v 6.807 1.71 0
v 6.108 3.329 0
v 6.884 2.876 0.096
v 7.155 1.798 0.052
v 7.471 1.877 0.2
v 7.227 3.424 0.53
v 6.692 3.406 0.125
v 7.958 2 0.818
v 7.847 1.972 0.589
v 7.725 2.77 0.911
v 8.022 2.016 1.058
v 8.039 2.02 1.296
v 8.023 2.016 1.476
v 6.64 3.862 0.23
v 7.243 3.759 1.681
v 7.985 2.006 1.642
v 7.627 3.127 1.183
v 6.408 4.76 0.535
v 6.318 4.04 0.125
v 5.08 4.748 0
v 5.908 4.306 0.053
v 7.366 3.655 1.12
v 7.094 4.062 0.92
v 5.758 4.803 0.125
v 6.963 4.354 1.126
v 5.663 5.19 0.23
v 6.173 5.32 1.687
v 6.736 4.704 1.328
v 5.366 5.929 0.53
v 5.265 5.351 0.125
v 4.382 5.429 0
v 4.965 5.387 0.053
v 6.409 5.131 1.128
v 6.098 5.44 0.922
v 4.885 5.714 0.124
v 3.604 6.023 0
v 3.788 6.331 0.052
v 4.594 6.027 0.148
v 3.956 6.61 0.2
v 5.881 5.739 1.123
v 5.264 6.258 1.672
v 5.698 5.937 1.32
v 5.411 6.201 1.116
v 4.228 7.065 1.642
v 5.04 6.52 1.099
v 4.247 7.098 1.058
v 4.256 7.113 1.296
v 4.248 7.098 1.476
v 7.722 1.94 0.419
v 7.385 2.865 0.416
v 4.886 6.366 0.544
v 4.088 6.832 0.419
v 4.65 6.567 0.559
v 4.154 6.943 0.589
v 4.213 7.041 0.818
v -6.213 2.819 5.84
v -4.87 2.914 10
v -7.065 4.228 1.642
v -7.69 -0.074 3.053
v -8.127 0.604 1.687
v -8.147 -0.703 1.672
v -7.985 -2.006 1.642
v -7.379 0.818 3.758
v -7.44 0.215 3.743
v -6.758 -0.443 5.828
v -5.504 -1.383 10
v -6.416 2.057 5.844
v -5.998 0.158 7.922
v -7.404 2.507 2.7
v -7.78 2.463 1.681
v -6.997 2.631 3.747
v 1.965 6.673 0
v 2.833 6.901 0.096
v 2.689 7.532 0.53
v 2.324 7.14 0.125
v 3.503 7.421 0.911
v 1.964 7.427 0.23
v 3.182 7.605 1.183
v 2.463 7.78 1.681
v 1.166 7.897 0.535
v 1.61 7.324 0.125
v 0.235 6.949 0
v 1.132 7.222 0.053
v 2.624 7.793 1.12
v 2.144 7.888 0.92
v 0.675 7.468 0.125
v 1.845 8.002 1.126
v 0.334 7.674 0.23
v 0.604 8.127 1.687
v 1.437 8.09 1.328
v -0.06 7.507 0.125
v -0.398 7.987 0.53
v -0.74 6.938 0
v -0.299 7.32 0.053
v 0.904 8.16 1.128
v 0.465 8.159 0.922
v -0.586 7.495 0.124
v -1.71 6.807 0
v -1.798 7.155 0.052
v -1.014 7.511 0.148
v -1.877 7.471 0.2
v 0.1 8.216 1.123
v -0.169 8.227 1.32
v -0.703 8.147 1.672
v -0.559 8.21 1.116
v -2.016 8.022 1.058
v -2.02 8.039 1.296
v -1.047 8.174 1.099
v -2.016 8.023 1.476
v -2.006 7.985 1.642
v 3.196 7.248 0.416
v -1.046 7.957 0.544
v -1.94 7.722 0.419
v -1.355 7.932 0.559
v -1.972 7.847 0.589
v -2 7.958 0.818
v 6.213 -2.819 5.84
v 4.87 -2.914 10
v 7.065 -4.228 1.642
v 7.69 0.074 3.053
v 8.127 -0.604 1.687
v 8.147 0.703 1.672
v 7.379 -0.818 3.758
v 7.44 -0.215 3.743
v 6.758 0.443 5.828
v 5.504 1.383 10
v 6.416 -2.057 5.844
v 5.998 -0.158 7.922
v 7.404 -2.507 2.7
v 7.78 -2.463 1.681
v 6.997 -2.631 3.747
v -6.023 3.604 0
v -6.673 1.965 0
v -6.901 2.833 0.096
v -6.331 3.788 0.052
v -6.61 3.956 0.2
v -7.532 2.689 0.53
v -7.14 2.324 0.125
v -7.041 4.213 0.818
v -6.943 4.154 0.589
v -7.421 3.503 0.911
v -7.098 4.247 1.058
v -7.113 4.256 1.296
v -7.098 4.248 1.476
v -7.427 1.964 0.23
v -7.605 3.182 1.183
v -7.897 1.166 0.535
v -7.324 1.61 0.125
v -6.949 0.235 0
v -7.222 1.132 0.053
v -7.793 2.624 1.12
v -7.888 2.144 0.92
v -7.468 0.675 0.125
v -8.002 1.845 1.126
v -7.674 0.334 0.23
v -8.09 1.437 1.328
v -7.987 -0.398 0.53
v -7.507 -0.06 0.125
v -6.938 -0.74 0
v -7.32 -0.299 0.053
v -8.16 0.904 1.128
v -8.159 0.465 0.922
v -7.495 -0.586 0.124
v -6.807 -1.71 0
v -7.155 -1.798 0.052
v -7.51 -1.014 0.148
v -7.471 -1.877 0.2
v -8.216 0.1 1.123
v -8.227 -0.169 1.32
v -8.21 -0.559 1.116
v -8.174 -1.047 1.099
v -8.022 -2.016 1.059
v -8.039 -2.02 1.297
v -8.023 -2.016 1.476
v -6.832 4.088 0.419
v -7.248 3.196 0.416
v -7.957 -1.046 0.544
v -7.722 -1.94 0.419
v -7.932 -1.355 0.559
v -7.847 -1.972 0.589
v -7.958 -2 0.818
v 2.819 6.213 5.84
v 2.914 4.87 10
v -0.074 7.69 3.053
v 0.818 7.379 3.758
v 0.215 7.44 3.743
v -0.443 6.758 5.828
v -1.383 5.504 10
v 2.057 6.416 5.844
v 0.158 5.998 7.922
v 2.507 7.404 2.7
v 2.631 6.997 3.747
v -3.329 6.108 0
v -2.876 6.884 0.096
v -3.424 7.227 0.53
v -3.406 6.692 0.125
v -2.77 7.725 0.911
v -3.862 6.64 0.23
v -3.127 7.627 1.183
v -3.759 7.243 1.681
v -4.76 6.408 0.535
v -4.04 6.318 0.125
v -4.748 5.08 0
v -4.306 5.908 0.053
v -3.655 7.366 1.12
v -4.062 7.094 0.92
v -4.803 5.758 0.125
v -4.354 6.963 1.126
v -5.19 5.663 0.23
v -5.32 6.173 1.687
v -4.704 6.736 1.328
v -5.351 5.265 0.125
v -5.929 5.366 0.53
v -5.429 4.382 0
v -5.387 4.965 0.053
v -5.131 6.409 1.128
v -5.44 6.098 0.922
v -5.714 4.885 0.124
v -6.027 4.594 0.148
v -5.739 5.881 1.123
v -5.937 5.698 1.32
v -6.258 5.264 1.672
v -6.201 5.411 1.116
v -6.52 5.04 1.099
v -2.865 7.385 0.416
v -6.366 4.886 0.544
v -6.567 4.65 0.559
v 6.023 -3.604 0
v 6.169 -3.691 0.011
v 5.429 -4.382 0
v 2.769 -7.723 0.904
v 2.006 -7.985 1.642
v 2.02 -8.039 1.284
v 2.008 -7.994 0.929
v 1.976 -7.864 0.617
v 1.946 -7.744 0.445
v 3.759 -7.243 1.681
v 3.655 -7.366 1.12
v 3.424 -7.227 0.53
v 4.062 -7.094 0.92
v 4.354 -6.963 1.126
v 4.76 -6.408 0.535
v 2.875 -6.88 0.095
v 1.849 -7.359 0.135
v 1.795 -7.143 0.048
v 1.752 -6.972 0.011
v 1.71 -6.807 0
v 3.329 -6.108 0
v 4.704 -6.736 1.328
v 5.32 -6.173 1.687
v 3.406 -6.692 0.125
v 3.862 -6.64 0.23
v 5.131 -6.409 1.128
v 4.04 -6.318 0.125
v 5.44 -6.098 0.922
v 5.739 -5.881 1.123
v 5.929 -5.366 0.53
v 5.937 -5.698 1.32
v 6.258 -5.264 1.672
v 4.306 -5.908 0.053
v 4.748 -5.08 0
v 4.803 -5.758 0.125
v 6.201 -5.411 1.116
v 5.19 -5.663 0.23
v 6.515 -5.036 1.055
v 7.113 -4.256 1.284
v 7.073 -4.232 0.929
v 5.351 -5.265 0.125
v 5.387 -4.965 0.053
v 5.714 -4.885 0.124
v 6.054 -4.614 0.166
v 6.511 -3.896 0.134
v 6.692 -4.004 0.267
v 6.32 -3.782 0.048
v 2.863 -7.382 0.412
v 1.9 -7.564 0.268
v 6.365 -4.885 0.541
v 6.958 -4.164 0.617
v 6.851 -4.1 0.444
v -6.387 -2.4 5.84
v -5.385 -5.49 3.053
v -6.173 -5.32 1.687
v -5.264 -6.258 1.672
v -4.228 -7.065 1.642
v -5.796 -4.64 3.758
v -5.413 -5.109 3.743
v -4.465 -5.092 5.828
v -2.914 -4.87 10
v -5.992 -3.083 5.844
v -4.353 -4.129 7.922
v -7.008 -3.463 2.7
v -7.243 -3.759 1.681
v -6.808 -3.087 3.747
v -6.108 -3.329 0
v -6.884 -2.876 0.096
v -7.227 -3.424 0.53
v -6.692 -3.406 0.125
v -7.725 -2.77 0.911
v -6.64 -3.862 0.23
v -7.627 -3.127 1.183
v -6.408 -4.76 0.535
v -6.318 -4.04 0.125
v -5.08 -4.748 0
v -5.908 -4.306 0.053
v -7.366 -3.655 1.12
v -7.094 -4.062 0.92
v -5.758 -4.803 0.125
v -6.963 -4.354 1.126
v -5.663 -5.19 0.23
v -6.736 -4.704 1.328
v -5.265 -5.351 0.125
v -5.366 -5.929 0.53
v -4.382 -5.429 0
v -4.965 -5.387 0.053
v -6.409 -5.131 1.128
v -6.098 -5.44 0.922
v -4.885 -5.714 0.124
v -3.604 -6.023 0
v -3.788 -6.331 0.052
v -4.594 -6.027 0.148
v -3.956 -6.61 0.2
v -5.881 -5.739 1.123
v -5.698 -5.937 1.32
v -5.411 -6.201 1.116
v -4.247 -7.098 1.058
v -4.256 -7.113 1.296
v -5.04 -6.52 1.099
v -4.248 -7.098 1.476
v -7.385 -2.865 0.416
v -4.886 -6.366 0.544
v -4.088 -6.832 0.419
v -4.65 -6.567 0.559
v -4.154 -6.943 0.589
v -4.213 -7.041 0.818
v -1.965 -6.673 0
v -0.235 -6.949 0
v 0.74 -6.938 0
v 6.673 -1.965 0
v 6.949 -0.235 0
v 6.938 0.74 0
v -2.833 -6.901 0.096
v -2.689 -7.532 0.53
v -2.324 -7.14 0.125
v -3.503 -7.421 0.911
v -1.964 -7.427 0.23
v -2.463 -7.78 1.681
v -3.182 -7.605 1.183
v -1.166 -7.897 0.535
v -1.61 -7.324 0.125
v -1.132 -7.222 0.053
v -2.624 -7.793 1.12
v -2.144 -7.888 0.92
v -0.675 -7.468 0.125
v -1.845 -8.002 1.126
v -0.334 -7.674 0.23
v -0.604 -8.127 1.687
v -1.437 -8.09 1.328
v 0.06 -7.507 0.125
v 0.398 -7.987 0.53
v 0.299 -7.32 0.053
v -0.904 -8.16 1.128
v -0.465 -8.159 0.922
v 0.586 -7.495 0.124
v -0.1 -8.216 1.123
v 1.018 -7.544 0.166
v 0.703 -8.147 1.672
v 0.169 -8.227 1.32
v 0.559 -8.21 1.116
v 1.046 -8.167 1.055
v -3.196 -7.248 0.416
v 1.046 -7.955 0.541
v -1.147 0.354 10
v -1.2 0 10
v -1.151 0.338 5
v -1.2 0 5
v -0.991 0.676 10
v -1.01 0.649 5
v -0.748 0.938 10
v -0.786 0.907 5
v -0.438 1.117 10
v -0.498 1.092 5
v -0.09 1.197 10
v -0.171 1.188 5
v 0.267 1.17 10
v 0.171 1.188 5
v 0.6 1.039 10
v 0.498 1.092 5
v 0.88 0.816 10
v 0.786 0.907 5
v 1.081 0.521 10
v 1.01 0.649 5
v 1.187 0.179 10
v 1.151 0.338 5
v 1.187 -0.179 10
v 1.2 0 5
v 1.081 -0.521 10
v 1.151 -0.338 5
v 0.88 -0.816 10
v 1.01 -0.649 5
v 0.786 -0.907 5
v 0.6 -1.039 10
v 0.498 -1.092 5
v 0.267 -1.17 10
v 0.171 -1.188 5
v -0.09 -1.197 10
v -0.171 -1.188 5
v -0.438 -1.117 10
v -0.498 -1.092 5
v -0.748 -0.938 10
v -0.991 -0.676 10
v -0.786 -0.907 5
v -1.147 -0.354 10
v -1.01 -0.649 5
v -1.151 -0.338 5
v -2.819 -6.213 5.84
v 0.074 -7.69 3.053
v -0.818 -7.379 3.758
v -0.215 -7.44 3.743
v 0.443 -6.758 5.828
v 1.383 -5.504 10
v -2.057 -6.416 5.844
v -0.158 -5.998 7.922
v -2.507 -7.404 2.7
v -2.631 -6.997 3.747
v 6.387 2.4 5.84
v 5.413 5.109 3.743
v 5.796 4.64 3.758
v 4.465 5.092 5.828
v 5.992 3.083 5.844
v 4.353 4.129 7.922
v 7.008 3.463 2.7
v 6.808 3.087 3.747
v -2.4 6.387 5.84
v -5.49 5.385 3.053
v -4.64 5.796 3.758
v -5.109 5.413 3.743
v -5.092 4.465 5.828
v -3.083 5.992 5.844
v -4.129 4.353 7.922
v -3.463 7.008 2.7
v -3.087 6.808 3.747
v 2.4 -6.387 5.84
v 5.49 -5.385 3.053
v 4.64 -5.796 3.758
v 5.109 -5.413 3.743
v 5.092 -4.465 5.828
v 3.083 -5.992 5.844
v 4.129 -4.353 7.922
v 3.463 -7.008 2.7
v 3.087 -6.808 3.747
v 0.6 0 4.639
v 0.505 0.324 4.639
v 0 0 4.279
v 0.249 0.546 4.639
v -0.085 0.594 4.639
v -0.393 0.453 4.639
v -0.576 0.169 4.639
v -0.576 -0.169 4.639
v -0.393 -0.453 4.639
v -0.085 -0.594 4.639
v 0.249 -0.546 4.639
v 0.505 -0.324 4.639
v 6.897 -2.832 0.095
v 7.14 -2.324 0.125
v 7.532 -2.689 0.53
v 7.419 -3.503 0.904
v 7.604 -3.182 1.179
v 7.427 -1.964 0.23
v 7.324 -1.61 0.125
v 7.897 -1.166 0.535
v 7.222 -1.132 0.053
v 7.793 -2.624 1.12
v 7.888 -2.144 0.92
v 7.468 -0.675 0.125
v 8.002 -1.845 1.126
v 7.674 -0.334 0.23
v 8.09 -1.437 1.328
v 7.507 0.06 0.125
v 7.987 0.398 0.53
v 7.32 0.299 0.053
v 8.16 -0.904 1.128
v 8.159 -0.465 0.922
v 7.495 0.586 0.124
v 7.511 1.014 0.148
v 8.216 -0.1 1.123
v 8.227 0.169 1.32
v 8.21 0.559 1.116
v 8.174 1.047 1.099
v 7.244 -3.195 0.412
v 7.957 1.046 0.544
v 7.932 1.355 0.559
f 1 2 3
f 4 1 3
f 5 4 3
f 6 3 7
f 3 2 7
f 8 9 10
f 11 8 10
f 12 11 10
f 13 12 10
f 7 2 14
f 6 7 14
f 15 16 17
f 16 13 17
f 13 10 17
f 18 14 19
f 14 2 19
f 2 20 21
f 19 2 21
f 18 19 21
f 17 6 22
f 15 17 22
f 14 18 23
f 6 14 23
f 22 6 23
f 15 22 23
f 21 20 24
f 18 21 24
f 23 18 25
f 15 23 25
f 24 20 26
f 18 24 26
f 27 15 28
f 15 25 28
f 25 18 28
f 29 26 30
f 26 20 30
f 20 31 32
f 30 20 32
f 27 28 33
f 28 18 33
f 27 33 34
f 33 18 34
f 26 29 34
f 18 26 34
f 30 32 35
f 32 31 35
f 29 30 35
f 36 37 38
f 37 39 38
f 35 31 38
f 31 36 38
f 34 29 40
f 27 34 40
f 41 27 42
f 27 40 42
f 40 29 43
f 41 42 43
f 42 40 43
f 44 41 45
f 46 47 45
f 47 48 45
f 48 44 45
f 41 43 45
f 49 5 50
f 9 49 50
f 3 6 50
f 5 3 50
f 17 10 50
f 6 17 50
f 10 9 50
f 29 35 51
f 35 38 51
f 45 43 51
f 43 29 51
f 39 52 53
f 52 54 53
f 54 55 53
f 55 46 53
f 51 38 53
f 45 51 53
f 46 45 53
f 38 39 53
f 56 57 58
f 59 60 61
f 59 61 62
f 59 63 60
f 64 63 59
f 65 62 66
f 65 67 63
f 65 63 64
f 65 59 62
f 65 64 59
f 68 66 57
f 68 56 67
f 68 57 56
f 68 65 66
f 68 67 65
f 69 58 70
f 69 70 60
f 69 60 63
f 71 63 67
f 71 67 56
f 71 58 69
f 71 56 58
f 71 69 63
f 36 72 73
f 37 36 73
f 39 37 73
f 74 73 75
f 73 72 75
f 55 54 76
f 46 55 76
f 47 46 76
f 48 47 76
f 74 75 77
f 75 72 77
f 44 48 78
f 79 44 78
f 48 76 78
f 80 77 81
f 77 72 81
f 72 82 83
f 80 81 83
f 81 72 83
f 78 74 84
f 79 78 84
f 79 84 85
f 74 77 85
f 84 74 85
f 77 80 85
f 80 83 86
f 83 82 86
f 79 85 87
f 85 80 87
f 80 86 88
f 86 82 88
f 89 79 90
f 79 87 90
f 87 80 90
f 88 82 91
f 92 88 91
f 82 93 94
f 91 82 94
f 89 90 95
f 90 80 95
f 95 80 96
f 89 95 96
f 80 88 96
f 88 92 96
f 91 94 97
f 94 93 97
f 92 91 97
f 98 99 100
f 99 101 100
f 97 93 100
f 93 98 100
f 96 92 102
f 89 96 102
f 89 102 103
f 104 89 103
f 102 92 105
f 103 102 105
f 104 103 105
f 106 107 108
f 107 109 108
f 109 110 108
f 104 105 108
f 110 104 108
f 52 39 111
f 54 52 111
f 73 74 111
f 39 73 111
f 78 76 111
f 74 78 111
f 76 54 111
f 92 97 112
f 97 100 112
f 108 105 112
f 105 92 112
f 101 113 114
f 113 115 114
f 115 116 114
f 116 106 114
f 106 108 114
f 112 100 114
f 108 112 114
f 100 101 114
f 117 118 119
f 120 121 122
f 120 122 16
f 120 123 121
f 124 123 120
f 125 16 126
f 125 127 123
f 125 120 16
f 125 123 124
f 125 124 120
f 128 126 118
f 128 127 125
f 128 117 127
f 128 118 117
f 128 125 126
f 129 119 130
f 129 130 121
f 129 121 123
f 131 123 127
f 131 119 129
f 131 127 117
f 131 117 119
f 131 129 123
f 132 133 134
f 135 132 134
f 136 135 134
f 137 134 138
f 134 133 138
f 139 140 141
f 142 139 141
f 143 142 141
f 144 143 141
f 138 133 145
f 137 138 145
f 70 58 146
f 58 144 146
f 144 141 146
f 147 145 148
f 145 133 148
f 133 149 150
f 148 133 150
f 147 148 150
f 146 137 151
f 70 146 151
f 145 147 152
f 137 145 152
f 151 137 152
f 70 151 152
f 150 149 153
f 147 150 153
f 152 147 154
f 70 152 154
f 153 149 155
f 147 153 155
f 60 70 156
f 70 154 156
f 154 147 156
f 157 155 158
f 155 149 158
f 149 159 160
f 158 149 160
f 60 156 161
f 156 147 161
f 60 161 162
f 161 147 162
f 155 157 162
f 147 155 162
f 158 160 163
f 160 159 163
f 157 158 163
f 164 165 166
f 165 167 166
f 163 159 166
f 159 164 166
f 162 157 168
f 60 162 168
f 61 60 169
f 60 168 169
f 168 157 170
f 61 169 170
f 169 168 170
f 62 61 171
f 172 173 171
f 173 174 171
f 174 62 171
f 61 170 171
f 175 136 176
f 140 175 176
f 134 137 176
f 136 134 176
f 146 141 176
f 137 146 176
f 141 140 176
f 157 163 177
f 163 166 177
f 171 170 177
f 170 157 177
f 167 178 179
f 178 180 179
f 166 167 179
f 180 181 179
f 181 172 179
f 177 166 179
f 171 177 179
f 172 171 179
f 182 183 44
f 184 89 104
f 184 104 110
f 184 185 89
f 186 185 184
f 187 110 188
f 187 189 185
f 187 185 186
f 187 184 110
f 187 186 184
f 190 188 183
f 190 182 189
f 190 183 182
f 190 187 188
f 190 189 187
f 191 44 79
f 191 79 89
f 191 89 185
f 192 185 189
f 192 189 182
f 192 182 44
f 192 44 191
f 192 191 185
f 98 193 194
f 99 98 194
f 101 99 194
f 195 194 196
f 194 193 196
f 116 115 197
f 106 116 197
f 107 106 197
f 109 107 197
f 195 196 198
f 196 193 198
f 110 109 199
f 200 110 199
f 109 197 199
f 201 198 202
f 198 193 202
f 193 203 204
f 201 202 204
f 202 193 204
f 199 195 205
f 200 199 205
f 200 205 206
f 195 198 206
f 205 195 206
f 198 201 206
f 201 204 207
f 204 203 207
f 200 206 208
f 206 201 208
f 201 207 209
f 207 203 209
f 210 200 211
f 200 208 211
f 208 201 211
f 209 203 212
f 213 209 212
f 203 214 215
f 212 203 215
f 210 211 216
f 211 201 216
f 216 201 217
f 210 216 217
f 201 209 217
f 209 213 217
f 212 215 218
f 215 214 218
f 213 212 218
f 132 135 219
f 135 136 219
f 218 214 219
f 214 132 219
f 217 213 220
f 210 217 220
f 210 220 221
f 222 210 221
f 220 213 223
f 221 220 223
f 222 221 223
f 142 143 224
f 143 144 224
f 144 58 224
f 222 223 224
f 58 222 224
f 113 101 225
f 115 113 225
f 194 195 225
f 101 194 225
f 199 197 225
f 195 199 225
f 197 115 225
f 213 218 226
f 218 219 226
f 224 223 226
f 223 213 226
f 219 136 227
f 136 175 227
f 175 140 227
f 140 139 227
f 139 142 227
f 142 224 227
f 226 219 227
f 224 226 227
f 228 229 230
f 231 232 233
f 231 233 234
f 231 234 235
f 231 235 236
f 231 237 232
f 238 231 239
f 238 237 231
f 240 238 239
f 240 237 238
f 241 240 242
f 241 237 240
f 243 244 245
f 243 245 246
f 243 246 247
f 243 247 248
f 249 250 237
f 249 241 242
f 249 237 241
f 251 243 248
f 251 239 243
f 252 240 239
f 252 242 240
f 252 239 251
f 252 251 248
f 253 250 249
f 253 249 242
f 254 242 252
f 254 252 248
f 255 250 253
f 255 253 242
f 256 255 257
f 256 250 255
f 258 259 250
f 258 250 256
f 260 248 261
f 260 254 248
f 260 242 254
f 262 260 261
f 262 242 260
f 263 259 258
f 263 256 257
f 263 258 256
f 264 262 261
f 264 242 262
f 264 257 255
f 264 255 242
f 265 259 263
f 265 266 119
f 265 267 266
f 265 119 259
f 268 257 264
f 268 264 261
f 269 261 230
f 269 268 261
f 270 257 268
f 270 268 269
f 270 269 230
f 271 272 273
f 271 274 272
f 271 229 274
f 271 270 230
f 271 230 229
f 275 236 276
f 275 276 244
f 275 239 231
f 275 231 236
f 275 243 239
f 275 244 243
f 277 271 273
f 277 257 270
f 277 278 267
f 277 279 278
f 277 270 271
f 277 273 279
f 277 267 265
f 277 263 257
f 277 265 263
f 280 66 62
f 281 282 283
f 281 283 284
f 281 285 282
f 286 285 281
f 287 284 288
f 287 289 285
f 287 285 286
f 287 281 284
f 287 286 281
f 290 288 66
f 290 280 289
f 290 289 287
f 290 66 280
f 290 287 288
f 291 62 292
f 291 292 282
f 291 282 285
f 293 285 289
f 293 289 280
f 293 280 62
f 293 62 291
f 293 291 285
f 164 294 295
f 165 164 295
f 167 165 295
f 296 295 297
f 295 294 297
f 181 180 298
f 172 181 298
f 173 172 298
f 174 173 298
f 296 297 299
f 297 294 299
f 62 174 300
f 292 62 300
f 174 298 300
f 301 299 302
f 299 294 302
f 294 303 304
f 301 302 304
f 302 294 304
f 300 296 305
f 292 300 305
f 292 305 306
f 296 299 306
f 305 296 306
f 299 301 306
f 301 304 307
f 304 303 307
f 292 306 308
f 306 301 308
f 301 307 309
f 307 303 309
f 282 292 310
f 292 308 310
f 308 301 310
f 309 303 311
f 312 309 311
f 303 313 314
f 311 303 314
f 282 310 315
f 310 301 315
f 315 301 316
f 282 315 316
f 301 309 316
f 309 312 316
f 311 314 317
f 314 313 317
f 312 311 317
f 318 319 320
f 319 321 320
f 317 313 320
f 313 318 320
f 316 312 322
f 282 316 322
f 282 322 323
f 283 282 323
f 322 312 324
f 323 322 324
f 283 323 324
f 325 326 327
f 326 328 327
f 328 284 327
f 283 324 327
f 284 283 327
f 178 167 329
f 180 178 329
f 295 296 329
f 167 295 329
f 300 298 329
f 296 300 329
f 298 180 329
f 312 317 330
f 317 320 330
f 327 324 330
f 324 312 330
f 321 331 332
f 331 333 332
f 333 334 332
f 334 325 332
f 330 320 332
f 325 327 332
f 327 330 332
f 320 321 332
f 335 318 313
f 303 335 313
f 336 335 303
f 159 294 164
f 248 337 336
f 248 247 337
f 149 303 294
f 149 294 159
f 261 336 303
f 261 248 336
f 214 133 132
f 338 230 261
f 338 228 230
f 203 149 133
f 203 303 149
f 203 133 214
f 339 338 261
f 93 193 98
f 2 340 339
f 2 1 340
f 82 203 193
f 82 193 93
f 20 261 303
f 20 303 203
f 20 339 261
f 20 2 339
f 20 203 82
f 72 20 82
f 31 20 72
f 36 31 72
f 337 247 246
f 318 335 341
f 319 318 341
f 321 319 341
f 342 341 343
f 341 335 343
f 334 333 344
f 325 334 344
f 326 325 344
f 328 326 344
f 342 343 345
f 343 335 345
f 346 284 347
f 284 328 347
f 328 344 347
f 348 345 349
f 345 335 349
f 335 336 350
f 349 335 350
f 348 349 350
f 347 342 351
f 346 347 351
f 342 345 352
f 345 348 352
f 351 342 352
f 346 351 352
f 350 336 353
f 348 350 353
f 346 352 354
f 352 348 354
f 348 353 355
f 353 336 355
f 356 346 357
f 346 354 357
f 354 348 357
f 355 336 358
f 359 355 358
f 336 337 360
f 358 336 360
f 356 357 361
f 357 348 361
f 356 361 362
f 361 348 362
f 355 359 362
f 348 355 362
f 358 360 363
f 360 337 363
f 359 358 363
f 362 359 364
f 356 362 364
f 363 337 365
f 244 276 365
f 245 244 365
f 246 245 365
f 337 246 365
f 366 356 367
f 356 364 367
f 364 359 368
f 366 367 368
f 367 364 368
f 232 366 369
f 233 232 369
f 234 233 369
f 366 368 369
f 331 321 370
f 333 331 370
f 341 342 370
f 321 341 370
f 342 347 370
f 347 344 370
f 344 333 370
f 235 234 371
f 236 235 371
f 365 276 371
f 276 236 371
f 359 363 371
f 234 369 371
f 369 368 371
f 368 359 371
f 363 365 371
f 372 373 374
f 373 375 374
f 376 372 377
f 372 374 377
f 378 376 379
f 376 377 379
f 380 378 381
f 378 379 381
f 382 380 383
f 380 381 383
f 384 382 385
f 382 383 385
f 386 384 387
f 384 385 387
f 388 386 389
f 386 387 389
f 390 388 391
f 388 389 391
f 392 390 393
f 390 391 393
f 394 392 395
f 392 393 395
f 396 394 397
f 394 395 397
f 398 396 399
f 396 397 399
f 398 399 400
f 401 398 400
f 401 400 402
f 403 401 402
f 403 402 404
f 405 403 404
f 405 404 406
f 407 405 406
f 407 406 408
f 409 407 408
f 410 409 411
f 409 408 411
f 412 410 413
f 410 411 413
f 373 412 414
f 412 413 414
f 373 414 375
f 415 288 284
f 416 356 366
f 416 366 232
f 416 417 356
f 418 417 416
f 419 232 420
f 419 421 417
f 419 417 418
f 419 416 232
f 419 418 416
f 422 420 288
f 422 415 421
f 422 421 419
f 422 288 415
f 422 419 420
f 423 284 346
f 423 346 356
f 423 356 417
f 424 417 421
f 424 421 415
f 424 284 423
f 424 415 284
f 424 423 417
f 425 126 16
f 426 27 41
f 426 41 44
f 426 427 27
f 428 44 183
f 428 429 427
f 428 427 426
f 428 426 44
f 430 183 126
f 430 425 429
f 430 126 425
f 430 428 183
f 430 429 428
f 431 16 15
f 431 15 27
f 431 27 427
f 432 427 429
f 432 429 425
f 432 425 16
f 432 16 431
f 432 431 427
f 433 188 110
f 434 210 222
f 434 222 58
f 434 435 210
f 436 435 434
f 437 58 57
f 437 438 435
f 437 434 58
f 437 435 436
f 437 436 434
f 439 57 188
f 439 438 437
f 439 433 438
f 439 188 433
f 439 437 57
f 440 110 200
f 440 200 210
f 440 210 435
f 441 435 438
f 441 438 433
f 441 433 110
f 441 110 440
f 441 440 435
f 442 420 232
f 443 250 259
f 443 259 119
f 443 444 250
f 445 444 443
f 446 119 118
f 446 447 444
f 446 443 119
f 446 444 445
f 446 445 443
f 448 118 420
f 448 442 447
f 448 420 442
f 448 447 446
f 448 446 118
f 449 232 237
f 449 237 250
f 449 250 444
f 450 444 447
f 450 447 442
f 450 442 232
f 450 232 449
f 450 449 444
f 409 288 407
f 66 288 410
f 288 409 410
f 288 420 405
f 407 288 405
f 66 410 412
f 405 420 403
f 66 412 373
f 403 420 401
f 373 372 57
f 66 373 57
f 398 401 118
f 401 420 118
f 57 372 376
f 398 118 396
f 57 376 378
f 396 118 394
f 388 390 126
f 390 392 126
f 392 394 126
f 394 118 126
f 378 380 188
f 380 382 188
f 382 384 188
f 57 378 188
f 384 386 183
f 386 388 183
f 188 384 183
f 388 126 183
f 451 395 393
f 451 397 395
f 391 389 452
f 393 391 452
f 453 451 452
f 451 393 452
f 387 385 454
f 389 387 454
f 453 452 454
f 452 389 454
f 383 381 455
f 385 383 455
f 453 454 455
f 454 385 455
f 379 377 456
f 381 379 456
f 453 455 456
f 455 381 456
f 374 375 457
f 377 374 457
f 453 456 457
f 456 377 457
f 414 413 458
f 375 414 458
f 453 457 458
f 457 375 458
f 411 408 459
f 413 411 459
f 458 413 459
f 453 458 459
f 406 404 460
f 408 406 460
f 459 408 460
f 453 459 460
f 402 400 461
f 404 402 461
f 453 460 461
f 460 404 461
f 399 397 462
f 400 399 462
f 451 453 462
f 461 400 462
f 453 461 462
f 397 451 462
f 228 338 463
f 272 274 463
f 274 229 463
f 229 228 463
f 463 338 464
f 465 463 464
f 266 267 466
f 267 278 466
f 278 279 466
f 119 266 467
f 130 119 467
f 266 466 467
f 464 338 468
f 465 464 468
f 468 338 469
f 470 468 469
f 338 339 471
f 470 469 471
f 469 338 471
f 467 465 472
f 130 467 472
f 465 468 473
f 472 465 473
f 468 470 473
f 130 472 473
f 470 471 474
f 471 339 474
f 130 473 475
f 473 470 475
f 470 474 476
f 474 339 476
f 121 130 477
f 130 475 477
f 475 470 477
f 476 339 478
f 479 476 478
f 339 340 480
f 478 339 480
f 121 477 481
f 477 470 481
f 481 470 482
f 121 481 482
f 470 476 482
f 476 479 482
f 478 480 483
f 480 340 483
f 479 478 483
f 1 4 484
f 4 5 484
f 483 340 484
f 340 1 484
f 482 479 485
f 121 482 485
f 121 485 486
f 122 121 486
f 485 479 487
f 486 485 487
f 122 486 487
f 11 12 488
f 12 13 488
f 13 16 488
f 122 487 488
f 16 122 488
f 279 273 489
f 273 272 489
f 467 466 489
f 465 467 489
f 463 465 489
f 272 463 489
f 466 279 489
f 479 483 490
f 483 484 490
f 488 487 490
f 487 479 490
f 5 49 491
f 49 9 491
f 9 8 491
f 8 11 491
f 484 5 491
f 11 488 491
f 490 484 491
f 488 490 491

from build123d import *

# Parameters (mm, degrees)
F4_D     = 2.4
F4_DEPTH = 5
F4_TIP   = 0.7210327428
F5_R     = 1.27


# Not quite as in the source:
# - the arcs of a loft's sections are written as splines that run evenly, so that the points pair up as in the source's solid


with BuildPart() as f3:
    # F0 (on Top) → F3 section 0
    with BuildSketch(Plane.XY):
        with BuildLine():
            add(Edge.make_bspline(
                [(2.1287545667, -8.4725466174), (3.2378083255, -8.1938932963), (4.2910199355, -7.694831903), (6.1270120531, -6.3311147047), (6.9090701762, -5.4669954641), (7.4962519567, -4.4857383775)],
                knots=[0, 0, 0, 0, 0.5, 0.5, 1, 1, 1, 1], degree=3))
            add(Edge.make_bspline(
                [(7.4962519567, -4.4857383775), (8.0834337372, -3.504481291), (8.4752771134, -2.4068585241), (8.8092259113, -0.144322369), (8.7511999386, 1.0197008079), (8.4725466174, 2.1287545667)],
                knots=[0, 0, 0, 0, 0.5, 0.5, 1, 1, 1, 1], degree=3))
            add(Edge.make_bspline(
                [(8.4725466174, 2.1287545667), (8.1938932963, 3.2378083255), (7.694831903, 4.2910199355), (6.3311147047, 6.1270120531), (5.4669954641, 6.9090701762), (4.4857383775, 7.4962519567)],
                knots=[0, 0, 0, 0, 0.5, 0.5, 1, 1, 1, 1], degree=3))
            add(Edge.make_bspline(
                [(4.4857383775, 7.4962519567), (3.504481291, 8.0834337372), (2.4068585241, 8.4752771134), (0.144322369, 8.8092259113), (-1.0197008079, 8.7511999386), (-2.1287545667, 8.4725466174)],
                knots=[0, 0, 0, 0, 0.5, 0.5, 1, 1, 1, 1], degree=3))
            add(Edge.make_bspline(
                [(-2.1287545667, 8.4725466174), (-3.2378083255, 8.1938932963), (-4.2910199355, 7.694831903), (-6.1270120531, 6.3311147047), (-6.9090701762, 5.4669954641), (-7.4962519567, 4.4857383775)],
                knots=[0, 0, 0, 0, 0.5, 0.5, 1, 1, 1, 1], degree=3))
            add(Edge.make_bspline(
                [(-7.4962519567, 4.4857383775), (-8.0834337372, 3.504481291), (-8.4752771134, 2.4068585241), (-8.8092259113, 0.144322369), (-8.7511999386, -1.0197008079), (-8.4725466174, -2.1287545667)],
                knots=[0, 0, 0, 0, 0.5, 0.5, 1, 1, 1, 1], degree=3))
            add(Edge.make_bspline(
                [(-8.4725466174, -2.1287545667), (-8.1938932963, -3.2378083255), (-7.694831903, -4.2910199355), (-6.3311147047, -6.1270120531), (-5.4669954641, -6.9090701762), (-4.4857383775, -7.4962519567)],
                knots=[0, 0, 0, 0, 0.5, 0.5, 1, 1, 1, 1], degree=3))
            add(Edge.make_bspline(
                [(-4.4857383775, -7.4962519567), (-3.504481291, -8.0834337372), (-2.4068585241, -8.4752771134), (-0.144322369, -8.8092259113), (1.0197008079, -8.7511999386), (2.1287545667, -8.4725466174)],
                knots=[0, 0, 0, 0, 0.5, 0.5, 1, 1, 1, 1], degree=3))
        make_face()
    # F2 (on offset) → F3 section 1
    with BuildSketch(Plane.XY.offset(10)):
        Polygon((1.3828789294, -5.5039253369), (4.8697059974, -2.9140198603), (5.5039253369, 1.3828789294), (2.9140198603, 4.8697059974), (-1.3828789294, 5.5039253369), (-4.8697059974, 2.9140198603), (-5.5039253369, -1.3828789294), (-2.9140198603, -4.8697059974), align=None)
    loft(ruled=True)

    # F4
    with Locations(Plane.XY.offset(10)):
        with Locations((0, 0)):
            Hole(F4_D / 2, depth=F4_DEPTH)
            with Locations((0, 0, -(F4_DEPTH + F4_TIP / 2))):  # 118° drill point
                Cone(0, F4_D / 2, F4_TIP, mode=Mode.SUBTRACT)

    # F5
    f5_edges = [f3.edges().sort_by_distance(p)[0] for p in [
        (5.209016, -7.012973, 0),
        (8.642252, -1.27559, 0),
        (7.012973, 5.209016, 0),
        (1.27559, 8.642252, 0),
        (-5.209016, 7.012973, 0),
        (-8.642252, 1.27559, 0),
        (-7.012973, -5.209016, 0),
        (-1.27559, -8.642252, 0),
    ]]
    fillet(f5_edges, radius=F5_R)


solid = f3.part
